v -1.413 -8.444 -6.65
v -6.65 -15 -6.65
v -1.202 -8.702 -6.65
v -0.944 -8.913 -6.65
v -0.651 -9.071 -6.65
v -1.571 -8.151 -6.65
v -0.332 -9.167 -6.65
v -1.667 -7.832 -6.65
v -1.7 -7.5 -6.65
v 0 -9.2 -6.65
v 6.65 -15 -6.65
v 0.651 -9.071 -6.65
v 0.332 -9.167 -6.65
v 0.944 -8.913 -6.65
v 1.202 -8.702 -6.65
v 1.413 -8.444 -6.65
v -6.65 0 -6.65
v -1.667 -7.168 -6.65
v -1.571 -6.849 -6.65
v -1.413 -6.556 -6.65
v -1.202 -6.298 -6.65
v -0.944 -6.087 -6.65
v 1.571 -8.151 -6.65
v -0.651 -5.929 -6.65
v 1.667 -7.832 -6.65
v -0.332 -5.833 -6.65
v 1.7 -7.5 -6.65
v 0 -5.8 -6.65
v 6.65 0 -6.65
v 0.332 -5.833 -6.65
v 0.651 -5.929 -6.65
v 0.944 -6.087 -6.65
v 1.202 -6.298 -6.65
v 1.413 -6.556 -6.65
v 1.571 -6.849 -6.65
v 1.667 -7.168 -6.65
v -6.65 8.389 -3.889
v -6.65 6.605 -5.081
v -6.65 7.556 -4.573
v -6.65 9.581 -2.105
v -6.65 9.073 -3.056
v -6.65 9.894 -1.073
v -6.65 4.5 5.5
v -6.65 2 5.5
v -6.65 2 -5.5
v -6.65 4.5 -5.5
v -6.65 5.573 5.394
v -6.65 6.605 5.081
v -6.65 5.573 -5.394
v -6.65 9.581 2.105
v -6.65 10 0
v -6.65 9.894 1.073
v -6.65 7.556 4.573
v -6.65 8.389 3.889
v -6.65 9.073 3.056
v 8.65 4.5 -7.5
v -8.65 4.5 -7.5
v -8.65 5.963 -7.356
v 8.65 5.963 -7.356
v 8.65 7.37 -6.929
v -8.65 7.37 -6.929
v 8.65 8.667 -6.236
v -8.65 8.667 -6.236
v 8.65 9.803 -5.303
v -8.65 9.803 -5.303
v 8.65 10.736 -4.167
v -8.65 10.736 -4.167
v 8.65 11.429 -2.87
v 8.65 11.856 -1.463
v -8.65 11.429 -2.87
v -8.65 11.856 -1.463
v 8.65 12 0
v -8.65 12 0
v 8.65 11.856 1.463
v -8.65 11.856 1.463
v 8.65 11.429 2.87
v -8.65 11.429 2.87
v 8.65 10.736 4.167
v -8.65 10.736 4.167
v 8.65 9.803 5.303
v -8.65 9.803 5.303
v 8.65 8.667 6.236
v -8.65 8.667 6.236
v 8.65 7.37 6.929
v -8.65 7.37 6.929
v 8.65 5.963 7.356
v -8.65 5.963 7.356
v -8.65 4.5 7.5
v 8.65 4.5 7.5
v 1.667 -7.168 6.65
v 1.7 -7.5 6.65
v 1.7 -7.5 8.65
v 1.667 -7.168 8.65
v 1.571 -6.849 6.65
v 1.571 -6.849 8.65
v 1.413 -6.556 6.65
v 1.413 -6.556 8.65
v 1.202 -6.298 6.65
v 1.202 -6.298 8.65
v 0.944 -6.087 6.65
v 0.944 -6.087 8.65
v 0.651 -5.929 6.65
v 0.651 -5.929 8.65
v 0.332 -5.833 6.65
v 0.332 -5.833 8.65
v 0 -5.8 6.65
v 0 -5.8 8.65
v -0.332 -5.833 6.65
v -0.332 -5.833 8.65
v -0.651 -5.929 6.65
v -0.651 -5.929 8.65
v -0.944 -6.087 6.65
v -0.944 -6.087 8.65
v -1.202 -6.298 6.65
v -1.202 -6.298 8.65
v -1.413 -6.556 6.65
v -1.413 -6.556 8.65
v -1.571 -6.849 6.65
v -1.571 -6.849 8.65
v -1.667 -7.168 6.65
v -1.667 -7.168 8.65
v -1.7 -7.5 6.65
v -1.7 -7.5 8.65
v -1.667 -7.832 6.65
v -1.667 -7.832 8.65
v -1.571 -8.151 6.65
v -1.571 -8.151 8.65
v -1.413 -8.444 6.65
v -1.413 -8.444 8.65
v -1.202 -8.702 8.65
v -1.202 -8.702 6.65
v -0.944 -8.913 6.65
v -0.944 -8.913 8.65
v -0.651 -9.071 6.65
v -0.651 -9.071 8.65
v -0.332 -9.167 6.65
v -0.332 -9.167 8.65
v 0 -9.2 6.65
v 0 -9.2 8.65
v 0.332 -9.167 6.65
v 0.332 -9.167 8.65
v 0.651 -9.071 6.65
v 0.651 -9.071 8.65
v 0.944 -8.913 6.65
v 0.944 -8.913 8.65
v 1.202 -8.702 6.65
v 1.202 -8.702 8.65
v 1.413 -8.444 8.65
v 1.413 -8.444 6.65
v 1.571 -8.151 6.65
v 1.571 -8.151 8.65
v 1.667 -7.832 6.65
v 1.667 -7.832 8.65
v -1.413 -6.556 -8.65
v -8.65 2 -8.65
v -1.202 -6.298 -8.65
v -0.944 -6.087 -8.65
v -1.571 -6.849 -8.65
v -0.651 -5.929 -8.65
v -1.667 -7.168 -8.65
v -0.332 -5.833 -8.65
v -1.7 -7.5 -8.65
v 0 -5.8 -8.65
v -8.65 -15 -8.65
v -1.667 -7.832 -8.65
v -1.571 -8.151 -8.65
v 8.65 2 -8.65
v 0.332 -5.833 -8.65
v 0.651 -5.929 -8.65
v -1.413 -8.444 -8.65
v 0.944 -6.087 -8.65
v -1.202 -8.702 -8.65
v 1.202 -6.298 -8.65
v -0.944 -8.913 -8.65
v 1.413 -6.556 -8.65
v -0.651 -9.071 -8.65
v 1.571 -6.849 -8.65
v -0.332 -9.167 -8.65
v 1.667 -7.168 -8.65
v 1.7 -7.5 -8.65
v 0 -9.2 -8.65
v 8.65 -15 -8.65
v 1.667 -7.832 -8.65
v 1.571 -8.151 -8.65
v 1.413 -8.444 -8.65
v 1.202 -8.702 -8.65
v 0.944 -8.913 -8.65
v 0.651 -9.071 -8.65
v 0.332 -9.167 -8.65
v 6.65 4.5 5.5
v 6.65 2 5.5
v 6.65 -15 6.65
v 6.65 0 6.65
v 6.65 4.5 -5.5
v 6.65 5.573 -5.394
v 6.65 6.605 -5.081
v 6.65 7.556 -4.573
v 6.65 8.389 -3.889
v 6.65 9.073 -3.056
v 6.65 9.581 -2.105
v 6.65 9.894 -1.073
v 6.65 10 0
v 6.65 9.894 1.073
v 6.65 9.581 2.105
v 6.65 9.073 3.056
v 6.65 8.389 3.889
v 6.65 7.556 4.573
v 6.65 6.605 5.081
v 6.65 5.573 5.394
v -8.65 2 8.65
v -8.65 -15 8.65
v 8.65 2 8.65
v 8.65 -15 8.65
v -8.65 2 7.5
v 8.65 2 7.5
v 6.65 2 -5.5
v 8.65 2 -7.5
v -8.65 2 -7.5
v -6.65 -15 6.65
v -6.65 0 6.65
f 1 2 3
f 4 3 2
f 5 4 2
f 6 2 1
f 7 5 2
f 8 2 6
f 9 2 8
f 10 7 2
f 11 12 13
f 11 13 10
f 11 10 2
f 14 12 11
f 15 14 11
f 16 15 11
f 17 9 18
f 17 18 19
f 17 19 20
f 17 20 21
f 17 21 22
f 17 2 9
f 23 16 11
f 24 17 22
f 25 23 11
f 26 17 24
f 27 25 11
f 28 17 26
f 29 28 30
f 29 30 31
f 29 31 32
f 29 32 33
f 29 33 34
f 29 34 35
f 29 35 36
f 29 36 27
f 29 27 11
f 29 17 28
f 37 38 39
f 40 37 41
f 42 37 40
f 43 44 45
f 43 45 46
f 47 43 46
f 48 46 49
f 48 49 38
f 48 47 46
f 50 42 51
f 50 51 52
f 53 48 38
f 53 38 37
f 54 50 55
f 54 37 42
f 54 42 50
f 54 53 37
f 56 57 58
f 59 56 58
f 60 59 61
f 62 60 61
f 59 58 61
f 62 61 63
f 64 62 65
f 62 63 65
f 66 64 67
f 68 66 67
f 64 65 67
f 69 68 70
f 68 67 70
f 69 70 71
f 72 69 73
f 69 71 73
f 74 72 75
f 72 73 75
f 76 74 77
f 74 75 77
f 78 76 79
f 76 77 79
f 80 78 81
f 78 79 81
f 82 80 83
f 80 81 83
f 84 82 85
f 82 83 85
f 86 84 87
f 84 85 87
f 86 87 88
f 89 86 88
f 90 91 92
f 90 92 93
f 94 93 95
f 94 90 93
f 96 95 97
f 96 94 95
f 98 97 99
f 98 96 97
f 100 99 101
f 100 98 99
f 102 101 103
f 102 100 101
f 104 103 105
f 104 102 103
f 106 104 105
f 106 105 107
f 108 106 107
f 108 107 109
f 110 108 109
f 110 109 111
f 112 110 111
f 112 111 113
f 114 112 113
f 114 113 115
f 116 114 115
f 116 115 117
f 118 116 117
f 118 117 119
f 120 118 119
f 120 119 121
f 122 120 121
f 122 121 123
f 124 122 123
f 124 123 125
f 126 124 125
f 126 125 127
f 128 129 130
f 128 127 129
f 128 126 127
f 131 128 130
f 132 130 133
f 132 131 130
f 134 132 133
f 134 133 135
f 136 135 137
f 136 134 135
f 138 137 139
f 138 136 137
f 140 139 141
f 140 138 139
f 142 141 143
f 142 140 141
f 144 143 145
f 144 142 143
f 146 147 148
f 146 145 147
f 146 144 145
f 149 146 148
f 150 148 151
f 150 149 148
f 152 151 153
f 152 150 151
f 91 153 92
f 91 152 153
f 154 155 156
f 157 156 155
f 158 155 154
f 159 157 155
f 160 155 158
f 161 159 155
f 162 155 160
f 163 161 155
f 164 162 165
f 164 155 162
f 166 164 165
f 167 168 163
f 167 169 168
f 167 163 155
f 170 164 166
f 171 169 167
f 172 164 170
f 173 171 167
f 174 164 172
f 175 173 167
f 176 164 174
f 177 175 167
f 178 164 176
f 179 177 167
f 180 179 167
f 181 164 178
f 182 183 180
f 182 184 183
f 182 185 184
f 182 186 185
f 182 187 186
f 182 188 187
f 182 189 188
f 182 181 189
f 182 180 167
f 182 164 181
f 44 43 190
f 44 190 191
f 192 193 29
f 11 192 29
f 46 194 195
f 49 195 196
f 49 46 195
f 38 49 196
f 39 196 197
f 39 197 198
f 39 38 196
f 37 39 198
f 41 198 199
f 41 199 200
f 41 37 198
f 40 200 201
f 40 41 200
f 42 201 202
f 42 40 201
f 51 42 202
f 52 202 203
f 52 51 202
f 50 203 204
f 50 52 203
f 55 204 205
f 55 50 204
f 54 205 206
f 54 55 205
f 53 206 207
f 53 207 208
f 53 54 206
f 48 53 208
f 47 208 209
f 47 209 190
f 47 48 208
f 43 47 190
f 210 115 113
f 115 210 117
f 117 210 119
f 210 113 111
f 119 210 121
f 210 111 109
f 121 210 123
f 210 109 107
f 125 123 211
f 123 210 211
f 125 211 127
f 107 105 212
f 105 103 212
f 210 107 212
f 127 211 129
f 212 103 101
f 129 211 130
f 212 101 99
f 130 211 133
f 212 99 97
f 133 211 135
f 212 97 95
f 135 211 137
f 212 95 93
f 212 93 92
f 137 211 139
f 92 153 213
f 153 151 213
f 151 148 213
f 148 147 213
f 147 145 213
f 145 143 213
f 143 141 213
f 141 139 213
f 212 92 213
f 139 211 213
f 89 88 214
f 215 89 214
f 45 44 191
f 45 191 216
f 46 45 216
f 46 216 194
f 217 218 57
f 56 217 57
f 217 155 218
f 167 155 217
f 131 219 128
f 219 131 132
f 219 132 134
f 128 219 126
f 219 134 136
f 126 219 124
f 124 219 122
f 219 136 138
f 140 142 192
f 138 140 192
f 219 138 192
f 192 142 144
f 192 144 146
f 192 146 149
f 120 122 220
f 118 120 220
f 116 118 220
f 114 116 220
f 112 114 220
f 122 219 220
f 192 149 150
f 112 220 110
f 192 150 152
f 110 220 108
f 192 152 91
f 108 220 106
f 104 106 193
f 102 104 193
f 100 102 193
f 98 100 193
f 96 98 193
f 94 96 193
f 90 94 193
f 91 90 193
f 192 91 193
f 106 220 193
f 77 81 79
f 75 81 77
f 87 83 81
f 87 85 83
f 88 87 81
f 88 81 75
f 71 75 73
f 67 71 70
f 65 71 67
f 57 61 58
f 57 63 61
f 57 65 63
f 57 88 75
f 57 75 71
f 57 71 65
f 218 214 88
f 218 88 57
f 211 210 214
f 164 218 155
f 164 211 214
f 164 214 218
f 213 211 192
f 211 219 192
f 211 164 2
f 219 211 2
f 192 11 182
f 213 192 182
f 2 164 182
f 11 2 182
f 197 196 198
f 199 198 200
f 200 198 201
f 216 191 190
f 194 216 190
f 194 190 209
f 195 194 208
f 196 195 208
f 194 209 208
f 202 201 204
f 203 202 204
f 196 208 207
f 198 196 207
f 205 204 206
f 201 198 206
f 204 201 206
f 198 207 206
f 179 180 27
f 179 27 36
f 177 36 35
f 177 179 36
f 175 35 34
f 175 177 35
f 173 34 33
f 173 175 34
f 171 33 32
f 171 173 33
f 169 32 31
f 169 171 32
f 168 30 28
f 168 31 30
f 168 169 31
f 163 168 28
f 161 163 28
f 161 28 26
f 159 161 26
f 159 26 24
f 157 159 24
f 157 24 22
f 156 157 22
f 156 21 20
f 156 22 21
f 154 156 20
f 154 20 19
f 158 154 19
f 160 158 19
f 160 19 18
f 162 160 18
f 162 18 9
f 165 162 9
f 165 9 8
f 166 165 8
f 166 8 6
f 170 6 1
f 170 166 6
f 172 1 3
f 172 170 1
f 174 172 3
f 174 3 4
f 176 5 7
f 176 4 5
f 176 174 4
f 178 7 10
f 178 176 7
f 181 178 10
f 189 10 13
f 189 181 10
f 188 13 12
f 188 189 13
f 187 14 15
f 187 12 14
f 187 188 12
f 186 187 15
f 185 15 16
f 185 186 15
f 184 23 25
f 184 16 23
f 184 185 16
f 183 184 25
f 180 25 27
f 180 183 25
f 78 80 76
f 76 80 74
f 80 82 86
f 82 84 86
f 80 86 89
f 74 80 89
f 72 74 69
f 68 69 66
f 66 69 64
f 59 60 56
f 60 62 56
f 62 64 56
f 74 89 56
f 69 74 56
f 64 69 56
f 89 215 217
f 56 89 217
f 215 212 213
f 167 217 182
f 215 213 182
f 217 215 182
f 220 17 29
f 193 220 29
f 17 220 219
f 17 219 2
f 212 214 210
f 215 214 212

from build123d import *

# Parameters (mm, degrees)
CROQUIS3_W                   = 17.3
CROQUIS3_H                   = 17.3
CROQUIS3_W_2                 = 13.3
CROQUIS3_H_2                 = 13.3
SALIENTE_EXTRUIR1_DEPTH      = 15
CROQUIS3_2_W                 = 17.3
CROQUIS3_2_H                 = 17.3
CROQUIS3_2_W_2               = 13.3
CROQUIS3_2_H_2               = 13.3
SALIENTE_EXTRUIR2_DEPTH      = 2
CORTAR_EXTRUIR1_DEPTH        = 20.3557485
CORTAR_EXTRUIR1_DEPTH_BACK   = 20.3557485
CROQUIS5_R                   = 1.7
SALIENTE_EXTRUIR4_DEPTH      = 8.65
SALIENTE_EXTRUIR4_DEPTH_BACK = 8.65
VACIADO1_START               = -6.65
VACIADO1_DEPTH               = 13.3


# Read off the part's stored shape, not the designer's step: Vaciado1
with BuildPart() as part:
    # Croquis3 → Saliente-Extruir1 (new body)
    with BuildSketch(Plane(origin=(0, 0, 0), x_dir=(1, 0, 0), z_dir=(0, 1, 0))):
        Rectangle(CROQUIS3_W, CROQUIS3_H)
        Rectangle(CROQUIS3_W_2, CROQUIS3_H_2, mode=Mode.SUBTRACT)
    extrude(amount=-SALIENTE_EXTRUIR1_DEPTH)

    # Croquis3<2> → Saliente-Extruir2 (add)
    # profile 1 of 2: a face of its own
    with BuildSketch(Plane(origin=(0, 0, 0), x_dir=(1, 0, 0), z_dir=(0, 1, 0))):
        Rectangle(CROQUIS3_2_W, CROQUIS3_2_H)
        Rectangle(CROQUIS3_2_W_2, CROQUIS3_2_H_2, mode=Mode.SUBTRACT)
    # profile 2 of 2: a face of its own
    with BuildSketch(Plane(origin=(0, 0, 0), x_dir=(1, 0, 0), z_dir=(0, 1, 0))):
        Rectangle(CROQUIS3_2_W_2, CROQUIS3_2_H_2)
    extrude(amount=SALIENTE_EXTRUIR2_DEPTH)

    # Croquis5 → Cortar-Extruir1 (cut, two sides: drawn at the far end of the back side and taken through both)
    with BuildSketch(Plane.XY.offset(-CORTAR_EXTRUIR1_DEPTH_BACK)):
        with Locations((0, -7.5)):
            Circle(CROQUIS5_R)
    extrude(amount=CORTAR_EXTRUIR1_DEPTH + CORTAR_EXTRUIR1_DEPTH_BACK, mode=Mode.SUBTRACT)

    # Croquis7 → Saliente-Extruir4 (add, two sides: drawn at the far end of the back side and taken through both)
    with BuildSketch(Plane(origin=(0, 0, 0), x_dir=(0, 0, -1), z_dir=(1, 0, 0)).offset(-SALIENTE_EXTRUIR4_DEPTH_BACK)):
        with BuildLine():
            Line((-7.5, 4.5), (-7.5, 2))
            Line((-7.5, 2), (7.5, 2))
            Line((7.5, 2), (7.5, 4.5))
            ThreePointArc((7.5, 4.5), (0, 12), (-7.5, 4.5))
        make_face()
    extrude(amount=SALIENTE_EXTRUIR4_DEPTH + SALIENTE_EXTRUIR4_DEPTH_BACK)

    # Vaciado1 outline → Vaciado1 (cut)
    with BuildSketch(Plane.YZ.offset(VACIADO1_START)):
        with BuildLine():
            Line((2, 5.5), (2, -5.5))
            Line((2, -5.5), (4.5, -5.5))
            ThreePointArc((4.5, -5.5), (10, 0), (4.5, 5.5))
            Line((4.5, 5.5), (2, 5.5))
        make_face()
    extrude(amount=VACIADO1_DEPTH, mode=Mode.SUBTRACT)


solid = part.part
